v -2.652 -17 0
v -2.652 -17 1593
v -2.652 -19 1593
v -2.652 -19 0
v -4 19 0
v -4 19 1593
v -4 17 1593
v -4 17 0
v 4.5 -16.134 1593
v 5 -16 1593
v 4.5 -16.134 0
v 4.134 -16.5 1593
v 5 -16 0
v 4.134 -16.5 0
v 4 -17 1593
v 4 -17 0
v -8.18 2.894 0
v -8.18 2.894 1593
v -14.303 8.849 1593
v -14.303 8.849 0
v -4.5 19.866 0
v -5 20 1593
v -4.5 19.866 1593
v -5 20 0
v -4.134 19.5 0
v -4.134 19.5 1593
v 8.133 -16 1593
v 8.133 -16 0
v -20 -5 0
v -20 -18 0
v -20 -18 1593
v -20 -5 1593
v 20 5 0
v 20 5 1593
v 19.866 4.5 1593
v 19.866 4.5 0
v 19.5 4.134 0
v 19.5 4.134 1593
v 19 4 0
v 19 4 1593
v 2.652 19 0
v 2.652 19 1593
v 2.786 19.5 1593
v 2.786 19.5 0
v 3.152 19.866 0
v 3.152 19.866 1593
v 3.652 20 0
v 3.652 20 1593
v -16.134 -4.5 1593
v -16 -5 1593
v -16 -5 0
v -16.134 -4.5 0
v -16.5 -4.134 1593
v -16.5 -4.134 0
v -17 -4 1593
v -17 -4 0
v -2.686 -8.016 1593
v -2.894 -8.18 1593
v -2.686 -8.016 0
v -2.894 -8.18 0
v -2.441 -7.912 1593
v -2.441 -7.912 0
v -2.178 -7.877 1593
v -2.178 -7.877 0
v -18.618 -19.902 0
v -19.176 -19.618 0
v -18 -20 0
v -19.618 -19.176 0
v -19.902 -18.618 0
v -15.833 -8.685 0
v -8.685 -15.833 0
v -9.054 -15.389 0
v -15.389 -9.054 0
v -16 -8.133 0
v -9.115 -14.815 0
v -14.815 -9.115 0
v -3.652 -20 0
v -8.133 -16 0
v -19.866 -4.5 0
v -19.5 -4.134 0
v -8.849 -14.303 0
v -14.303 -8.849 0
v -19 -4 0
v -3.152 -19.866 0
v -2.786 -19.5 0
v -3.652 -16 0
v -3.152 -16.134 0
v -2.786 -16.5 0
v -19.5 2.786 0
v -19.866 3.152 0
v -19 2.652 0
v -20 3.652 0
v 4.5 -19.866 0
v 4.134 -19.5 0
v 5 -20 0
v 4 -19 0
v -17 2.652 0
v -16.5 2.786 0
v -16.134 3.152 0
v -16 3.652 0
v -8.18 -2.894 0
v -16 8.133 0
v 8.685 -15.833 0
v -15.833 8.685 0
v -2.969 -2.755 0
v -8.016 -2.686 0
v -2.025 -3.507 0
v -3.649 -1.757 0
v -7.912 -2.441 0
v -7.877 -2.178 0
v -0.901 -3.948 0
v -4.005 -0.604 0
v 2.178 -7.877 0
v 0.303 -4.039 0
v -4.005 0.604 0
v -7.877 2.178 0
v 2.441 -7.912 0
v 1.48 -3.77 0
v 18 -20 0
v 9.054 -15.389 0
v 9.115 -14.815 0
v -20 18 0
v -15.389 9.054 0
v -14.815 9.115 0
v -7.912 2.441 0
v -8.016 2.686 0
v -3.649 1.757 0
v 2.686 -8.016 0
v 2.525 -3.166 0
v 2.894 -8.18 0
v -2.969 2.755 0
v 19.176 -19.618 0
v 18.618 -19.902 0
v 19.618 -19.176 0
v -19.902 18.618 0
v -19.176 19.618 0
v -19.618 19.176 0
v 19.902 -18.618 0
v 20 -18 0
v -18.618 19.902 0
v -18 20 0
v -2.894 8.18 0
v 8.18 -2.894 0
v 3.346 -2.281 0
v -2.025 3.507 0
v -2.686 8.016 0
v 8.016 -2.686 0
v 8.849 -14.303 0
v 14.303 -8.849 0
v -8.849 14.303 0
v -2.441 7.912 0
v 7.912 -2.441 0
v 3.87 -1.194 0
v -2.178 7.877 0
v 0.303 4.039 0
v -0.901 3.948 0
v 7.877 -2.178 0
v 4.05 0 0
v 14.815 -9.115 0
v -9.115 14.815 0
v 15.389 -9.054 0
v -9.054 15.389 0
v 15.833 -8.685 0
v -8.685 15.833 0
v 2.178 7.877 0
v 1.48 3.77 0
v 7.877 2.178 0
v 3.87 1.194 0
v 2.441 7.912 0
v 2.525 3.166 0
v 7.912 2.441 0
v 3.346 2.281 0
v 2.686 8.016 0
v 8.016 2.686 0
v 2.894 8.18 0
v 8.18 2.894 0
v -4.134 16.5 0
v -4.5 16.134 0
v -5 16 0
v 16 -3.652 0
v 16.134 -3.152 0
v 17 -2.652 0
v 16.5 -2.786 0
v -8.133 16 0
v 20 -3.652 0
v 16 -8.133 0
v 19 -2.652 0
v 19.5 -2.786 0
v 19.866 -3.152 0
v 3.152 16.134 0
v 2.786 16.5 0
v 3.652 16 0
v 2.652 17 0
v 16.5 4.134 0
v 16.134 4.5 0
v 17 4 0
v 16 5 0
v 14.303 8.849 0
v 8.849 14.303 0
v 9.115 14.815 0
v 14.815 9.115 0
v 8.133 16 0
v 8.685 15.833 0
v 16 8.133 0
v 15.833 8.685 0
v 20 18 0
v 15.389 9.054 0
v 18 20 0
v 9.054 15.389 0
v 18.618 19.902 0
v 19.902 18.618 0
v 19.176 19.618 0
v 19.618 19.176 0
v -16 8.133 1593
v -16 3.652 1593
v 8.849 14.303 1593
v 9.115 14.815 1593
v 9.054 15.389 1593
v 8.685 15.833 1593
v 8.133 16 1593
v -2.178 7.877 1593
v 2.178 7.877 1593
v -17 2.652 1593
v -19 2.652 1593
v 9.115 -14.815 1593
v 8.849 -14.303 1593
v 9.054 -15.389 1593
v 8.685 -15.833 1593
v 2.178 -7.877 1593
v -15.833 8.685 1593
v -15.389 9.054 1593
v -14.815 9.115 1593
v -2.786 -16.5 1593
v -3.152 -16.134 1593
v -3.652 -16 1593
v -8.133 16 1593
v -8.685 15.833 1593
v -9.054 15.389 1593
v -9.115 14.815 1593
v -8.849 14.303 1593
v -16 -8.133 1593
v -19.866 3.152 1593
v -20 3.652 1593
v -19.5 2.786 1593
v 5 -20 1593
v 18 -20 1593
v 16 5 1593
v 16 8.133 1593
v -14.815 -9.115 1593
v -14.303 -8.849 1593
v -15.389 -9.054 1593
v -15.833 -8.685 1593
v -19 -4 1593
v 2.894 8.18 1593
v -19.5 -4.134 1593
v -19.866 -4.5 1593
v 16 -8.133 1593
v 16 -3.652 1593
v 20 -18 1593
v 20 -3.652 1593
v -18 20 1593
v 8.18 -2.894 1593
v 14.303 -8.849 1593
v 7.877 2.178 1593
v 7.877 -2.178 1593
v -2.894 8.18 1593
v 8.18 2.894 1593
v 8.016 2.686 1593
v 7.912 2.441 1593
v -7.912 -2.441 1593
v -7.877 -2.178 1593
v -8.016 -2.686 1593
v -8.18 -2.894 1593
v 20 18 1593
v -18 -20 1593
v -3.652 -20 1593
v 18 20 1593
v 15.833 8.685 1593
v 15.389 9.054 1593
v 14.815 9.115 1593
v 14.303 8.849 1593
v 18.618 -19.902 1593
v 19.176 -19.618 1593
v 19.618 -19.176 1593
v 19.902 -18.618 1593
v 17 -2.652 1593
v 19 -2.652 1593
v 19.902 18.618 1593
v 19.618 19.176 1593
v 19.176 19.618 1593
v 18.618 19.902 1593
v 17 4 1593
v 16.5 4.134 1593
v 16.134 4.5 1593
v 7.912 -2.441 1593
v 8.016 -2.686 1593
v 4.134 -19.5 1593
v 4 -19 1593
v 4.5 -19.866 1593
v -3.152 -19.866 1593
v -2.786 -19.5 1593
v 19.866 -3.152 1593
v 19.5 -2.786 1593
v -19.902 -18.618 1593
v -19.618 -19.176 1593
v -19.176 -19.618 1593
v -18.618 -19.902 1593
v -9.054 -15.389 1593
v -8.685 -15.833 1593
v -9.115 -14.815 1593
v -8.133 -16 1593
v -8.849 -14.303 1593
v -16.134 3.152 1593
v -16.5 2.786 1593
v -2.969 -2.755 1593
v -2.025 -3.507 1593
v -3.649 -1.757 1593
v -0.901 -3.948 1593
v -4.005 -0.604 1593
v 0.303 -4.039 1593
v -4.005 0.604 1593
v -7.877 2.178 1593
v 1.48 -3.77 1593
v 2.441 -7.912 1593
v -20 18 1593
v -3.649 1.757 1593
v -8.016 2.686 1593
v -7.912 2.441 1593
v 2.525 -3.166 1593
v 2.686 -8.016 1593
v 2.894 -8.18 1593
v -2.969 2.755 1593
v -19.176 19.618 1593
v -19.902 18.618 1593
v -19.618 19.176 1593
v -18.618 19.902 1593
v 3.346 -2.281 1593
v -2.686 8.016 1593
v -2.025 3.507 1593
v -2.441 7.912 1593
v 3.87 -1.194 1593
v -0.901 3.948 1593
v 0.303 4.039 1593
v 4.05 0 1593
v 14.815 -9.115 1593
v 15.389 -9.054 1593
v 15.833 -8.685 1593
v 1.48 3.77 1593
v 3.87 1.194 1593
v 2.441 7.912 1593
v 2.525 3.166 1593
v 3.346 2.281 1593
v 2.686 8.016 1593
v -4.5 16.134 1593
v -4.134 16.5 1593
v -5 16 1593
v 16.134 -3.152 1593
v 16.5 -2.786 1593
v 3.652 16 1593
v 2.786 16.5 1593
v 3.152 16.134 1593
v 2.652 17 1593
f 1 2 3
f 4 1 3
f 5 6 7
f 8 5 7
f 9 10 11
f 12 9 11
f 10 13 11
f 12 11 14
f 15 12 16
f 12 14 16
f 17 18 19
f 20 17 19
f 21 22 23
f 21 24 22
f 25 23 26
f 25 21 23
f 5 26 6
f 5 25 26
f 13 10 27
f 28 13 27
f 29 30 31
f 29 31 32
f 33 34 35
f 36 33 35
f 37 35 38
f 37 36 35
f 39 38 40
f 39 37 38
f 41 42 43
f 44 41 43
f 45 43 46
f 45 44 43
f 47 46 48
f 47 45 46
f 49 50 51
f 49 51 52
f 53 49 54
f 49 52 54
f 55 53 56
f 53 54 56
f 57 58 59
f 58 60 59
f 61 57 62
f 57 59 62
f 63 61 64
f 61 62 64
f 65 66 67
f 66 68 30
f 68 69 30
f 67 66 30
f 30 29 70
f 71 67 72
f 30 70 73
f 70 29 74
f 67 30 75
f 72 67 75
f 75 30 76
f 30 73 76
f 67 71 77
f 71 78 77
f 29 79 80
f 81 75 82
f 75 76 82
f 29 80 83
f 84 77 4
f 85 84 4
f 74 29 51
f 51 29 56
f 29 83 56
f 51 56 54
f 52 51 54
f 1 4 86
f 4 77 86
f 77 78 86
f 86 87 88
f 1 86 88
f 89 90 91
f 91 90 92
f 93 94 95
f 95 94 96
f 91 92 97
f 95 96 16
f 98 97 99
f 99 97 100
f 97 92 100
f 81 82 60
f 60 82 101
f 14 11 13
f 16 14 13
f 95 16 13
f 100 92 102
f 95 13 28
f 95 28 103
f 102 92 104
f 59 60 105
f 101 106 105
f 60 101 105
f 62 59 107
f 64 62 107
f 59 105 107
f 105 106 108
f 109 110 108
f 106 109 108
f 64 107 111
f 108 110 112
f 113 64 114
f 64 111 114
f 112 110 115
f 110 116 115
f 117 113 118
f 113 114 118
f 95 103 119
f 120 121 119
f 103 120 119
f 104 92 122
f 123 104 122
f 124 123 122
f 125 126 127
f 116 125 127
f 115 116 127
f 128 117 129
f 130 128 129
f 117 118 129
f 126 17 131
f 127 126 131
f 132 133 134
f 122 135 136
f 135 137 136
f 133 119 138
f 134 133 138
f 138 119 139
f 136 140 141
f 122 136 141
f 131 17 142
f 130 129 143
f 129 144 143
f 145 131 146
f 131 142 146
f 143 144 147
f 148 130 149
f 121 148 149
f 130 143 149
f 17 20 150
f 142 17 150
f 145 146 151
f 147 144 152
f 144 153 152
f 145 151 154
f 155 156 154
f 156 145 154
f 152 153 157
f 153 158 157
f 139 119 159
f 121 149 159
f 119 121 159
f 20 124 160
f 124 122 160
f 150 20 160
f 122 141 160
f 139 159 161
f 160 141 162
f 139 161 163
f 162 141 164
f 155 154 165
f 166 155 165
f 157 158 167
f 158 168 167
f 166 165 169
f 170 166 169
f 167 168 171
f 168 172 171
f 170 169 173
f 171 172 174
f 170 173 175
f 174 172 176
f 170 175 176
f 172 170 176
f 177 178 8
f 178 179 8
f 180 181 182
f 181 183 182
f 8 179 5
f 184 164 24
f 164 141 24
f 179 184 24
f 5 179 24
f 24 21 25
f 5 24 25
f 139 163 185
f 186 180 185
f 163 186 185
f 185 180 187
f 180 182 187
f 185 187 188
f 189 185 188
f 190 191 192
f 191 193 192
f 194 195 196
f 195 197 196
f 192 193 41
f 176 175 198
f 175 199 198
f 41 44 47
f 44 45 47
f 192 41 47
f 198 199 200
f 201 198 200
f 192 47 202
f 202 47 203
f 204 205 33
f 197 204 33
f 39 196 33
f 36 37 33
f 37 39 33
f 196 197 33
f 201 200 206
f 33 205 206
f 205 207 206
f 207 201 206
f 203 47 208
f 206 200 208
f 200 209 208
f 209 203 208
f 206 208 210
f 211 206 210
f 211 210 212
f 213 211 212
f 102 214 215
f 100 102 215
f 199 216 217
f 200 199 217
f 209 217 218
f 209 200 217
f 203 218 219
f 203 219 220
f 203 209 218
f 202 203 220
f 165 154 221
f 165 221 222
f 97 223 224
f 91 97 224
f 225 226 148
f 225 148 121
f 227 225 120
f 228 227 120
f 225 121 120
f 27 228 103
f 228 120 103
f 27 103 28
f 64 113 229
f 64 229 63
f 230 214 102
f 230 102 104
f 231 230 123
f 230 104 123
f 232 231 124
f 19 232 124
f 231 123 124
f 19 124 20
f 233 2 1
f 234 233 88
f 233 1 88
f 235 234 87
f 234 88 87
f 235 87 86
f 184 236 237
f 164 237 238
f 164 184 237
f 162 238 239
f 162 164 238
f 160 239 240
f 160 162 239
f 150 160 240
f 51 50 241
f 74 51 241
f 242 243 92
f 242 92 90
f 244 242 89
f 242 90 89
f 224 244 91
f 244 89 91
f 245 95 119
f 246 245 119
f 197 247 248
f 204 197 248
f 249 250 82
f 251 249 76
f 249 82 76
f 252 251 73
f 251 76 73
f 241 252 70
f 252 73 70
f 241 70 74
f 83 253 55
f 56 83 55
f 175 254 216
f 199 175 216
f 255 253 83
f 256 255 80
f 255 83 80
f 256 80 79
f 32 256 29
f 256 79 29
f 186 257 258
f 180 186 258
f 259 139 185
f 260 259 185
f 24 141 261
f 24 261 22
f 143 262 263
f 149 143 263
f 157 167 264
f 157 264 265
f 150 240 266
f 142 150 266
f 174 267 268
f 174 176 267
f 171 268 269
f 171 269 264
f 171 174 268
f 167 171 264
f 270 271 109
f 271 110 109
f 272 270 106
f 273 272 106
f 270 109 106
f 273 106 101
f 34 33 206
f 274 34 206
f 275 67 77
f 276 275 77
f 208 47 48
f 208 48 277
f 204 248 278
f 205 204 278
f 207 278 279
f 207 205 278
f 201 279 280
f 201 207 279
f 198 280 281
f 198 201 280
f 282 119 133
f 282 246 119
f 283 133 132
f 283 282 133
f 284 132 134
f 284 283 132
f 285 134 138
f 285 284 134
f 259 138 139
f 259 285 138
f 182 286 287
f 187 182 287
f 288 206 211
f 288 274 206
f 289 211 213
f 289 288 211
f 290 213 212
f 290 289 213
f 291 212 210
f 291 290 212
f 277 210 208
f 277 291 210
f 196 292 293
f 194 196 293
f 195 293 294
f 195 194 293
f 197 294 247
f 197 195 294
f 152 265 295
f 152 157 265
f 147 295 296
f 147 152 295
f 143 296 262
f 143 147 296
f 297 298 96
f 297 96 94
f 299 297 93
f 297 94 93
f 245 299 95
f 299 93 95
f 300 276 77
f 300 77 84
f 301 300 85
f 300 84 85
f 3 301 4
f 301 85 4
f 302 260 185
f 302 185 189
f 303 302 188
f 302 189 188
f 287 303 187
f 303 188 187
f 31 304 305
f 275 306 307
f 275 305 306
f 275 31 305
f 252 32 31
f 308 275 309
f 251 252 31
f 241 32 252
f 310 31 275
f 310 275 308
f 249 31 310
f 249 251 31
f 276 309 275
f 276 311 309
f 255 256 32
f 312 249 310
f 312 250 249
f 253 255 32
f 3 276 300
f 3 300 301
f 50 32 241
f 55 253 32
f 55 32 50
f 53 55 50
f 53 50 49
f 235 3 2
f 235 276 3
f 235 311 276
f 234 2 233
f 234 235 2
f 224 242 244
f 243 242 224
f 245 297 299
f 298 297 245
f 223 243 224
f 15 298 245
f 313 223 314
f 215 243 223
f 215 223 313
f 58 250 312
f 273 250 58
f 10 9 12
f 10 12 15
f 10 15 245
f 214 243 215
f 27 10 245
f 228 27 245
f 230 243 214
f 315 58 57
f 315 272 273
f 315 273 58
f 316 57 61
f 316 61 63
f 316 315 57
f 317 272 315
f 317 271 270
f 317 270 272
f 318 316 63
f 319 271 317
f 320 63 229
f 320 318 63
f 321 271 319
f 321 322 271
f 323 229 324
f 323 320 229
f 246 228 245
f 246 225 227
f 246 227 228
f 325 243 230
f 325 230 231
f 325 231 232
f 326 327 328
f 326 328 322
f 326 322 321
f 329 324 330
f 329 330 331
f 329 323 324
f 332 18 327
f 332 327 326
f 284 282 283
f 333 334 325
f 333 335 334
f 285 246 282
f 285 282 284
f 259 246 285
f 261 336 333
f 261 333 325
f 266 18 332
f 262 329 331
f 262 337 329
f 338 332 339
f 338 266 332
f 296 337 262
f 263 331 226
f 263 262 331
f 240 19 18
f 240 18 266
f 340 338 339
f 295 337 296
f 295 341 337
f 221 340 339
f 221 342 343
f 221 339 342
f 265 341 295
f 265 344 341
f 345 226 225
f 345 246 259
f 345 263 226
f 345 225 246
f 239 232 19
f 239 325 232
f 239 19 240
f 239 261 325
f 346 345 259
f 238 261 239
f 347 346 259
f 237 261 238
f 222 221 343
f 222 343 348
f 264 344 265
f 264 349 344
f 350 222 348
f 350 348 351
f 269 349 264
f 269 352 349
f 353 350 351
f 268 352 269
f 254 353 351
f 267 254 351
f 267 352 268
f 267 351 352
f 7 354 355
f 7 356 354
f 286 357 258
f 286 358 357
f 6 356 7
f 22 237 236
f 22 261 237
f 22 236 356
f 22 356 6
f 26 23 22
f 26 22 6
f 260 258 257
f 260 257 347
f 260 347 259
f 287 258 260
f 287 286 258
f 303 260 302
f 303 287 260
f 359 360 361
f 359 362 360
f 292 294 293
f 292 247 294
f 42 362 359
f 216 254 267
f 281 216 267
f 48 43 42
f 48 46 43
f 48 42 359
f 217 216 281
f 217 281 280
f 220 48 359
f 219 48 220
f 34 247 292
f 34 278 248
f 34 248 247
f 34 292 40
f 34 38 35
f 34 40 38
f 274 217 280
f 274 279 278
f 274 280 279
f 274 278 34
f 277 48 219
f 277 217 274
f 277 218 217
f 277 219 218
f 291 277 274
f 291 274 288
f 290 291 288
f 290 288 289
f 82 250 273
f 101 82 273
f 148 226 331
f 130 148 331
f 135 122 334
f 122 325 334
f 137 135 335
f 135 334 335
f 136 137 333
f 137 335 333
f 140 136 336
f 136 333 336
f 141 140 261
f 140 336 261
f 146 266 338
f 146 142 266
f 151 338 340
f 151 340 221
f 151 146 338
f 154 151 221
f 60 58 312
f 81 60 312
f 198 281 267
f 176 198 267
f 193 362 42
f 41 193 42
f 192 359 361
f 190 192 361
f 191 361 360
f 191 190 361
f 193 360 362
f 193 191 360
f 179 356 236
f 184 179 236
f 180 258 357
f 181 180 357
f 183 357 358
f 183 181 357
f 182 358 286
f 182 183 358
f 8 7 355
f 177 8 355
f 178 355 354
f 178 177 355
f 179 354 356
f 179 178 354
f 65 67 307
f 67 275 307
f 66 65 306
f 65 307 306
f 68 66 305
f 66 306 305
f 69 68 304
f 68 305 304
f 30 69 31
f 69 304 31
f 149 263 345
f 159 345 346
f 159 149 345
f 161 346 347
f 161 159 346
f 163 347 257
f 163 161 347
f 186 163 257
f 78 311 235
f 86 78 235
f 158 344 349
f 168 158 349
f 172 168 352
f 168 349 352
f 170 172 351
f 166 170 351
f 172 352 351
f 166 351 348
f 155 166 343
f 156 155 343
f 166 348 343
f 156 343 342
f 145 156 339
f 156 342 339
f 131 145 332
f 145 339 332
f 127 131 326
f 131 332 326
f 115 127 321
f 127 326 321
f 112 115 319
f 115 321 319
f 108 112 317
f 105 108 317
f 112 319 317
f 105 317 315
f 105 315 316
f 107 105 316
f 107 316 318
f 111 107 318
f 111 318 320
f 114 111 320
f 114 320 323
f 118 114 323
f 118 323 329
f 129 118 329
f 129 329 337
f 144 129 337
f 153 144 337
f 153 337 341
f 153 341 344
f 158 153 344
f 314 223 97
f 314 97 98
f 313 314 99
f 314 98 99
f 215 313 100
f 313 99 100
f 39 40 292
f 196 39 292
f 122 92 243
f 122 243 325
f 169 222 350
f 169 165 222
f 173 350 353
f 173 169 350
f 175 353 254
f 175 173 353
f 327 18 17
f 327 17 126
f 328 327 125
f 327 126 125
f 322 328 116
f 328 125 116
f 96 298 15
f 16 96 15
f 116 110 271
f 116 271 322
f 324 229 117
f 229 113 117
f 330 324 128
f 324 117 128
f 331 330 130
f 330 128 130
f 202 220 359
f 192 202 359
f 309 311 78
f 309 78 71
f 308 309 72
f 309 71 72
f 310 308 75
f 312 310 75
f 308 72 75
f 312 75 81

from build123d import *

# Parameters (mm, degrees)
SKETCH_1_W               = 40
SKETCH_1_H               = 40
EXTRUDE_1_DEPTH          = 1593
SKETCH_2_R               = 4.05
CUT_EXTRUDE_1_DEPTH      = 10000
CUT_EXTRUDE_2_DEPTH      = 10000
FILLET_1_R               = 1
PATTERN_CIRCULAR_2_COUNT = 4
FILLET_2_R               = 1
FILLET_3_R               = 1
FILLET_4_R               = 1
FILLET_5_R               = 2


with BuildPart() as part:
    # 草图1 → 凸台-拉伸1 (new body)
    with BuildSketch(Plane.XY):
        Rectangle(SKETCH_1_W, SKETCH_1_H)
    extrude(amount=EXTRUDE_1_DEPTH)

    # 草图2 → 切除-拉伸1 (cut)
    with BuildSketch(Plane.XY.offset(1593)):
        Circle(SKETCH_2_R)
    extrude(amount=-CUT_EXTRUDE_1_DEPTH, mode=Mode.SUBTRACT)

    # 草图4 → 切除-拉伸2 (cut)
    with BuildSketch(Plane.XY.offset(1593)):
        Polygon((20, 0), (20, 4), (16, 4), (16, 10.5), (7.876860985, 2.6), (7.876860985, -2.6), (16, -10.5), (16, -2.65197969), (20, -2.65197969), align=None)
    cut_extrude_2 = extrude(amount=-CUT_EXTRUDE_2_DEPTH, mode=Mode.SUBTRACT)

    # 圆角1
    fillet_1_edges = [part.edges().sort_by_distance(p)[0] for p in [
        (20, -2.65197969, 796.5),
        (16, -2.65197969, 796.5),
        (16, -10.5, 796.5),
        (7.876860985, -2.6, 796.5),
        (7.876860985, 2.6, 796.5),
        (16, 10.5, 796.5),
        (16, 4, 796.5),
        (20, 4, 796.5),
    ]]
    fillet(fillet_1_edges, radius=FILLET_1_R)

    # 阵列(圆周)2: 切除-拉伸2 ×4 about axis
    pattern_circular_2_axis = Axis((0, 0, 0), (0, 0, 1))
    for i in range(1, PATTERN_CIRCULAR_2_COUNT):
        add(cut_extrude_2.rotate(pattern_circular_2_axis, i * 360 / PATTERN_CIRCULAR_2_COUNT), mode=Mode.SUBTRACT)

    # 圆角2
    fillet_2_edges = [part.edges().sort_by_distance(p)[0] for p in [
        (2.65197969, 20, 796.5),
        (2.65197969, 16, 796.5),
        (10.5, 16, 796.5),
        (2.6, 7.876860985, 796.5),
        (-2.6, 7.876860985, 796.5),
        (-10.5, 16, 796.5),
        (-4, 16, 796.5),
        (-4, 20, 796.5),
    ]]
    fillet(fillet_2_edges, radius=FILLET_2_R)

    # 圆角3
    fillet_3_edges = [part.edges().sort_by_distance(p)[0] for p in [
        (-20, 2.65197969, 796.5),
        (-16, 2.65197969, 796.5),
        (-16, 10.5, 796.5),
        (-7.876860985, 2.6, 796.5),
        (-7.876860985, -2.6, 796.5),
        (-16, -10.5, 796.5),
        (-16, -4, 796.5),
        (-20, -4, 796.5),
    ]]
    fillet(fillet_3_edges, radius=FILLET_3_R)

    # 圆角4
    fillet_4_edges = [part.edges().sort_by_distance(p)[0] for p in [
        (-2.65197969, -20, 796.5),
        (-2.65197969, -16, 796.5),
        (-10.5, -16, 796.5),
        (-2.6, -7.876860985, 796.5),
        (2.6, -7.876860985, 796.5),
        (10.5, -16, 796.5),
        (4, -16, 796.5),
        (4, -20, 796.5),
    ]]
    fillet(fillet_4_edges, radius=FILLET_4_R)

    # 圆角5
    fillet_5_edges = [part.edges().sort_by_distance(p)[0] for p in [
        (20, -20, 796.5),
        (-20, -20, 796.5),
        (-20, 20, 796.5),
        (20, 20, 796.5),
    ]]
    fillet(fillet_5_edges, radius=FILLET_5_R)


solid = part.part
